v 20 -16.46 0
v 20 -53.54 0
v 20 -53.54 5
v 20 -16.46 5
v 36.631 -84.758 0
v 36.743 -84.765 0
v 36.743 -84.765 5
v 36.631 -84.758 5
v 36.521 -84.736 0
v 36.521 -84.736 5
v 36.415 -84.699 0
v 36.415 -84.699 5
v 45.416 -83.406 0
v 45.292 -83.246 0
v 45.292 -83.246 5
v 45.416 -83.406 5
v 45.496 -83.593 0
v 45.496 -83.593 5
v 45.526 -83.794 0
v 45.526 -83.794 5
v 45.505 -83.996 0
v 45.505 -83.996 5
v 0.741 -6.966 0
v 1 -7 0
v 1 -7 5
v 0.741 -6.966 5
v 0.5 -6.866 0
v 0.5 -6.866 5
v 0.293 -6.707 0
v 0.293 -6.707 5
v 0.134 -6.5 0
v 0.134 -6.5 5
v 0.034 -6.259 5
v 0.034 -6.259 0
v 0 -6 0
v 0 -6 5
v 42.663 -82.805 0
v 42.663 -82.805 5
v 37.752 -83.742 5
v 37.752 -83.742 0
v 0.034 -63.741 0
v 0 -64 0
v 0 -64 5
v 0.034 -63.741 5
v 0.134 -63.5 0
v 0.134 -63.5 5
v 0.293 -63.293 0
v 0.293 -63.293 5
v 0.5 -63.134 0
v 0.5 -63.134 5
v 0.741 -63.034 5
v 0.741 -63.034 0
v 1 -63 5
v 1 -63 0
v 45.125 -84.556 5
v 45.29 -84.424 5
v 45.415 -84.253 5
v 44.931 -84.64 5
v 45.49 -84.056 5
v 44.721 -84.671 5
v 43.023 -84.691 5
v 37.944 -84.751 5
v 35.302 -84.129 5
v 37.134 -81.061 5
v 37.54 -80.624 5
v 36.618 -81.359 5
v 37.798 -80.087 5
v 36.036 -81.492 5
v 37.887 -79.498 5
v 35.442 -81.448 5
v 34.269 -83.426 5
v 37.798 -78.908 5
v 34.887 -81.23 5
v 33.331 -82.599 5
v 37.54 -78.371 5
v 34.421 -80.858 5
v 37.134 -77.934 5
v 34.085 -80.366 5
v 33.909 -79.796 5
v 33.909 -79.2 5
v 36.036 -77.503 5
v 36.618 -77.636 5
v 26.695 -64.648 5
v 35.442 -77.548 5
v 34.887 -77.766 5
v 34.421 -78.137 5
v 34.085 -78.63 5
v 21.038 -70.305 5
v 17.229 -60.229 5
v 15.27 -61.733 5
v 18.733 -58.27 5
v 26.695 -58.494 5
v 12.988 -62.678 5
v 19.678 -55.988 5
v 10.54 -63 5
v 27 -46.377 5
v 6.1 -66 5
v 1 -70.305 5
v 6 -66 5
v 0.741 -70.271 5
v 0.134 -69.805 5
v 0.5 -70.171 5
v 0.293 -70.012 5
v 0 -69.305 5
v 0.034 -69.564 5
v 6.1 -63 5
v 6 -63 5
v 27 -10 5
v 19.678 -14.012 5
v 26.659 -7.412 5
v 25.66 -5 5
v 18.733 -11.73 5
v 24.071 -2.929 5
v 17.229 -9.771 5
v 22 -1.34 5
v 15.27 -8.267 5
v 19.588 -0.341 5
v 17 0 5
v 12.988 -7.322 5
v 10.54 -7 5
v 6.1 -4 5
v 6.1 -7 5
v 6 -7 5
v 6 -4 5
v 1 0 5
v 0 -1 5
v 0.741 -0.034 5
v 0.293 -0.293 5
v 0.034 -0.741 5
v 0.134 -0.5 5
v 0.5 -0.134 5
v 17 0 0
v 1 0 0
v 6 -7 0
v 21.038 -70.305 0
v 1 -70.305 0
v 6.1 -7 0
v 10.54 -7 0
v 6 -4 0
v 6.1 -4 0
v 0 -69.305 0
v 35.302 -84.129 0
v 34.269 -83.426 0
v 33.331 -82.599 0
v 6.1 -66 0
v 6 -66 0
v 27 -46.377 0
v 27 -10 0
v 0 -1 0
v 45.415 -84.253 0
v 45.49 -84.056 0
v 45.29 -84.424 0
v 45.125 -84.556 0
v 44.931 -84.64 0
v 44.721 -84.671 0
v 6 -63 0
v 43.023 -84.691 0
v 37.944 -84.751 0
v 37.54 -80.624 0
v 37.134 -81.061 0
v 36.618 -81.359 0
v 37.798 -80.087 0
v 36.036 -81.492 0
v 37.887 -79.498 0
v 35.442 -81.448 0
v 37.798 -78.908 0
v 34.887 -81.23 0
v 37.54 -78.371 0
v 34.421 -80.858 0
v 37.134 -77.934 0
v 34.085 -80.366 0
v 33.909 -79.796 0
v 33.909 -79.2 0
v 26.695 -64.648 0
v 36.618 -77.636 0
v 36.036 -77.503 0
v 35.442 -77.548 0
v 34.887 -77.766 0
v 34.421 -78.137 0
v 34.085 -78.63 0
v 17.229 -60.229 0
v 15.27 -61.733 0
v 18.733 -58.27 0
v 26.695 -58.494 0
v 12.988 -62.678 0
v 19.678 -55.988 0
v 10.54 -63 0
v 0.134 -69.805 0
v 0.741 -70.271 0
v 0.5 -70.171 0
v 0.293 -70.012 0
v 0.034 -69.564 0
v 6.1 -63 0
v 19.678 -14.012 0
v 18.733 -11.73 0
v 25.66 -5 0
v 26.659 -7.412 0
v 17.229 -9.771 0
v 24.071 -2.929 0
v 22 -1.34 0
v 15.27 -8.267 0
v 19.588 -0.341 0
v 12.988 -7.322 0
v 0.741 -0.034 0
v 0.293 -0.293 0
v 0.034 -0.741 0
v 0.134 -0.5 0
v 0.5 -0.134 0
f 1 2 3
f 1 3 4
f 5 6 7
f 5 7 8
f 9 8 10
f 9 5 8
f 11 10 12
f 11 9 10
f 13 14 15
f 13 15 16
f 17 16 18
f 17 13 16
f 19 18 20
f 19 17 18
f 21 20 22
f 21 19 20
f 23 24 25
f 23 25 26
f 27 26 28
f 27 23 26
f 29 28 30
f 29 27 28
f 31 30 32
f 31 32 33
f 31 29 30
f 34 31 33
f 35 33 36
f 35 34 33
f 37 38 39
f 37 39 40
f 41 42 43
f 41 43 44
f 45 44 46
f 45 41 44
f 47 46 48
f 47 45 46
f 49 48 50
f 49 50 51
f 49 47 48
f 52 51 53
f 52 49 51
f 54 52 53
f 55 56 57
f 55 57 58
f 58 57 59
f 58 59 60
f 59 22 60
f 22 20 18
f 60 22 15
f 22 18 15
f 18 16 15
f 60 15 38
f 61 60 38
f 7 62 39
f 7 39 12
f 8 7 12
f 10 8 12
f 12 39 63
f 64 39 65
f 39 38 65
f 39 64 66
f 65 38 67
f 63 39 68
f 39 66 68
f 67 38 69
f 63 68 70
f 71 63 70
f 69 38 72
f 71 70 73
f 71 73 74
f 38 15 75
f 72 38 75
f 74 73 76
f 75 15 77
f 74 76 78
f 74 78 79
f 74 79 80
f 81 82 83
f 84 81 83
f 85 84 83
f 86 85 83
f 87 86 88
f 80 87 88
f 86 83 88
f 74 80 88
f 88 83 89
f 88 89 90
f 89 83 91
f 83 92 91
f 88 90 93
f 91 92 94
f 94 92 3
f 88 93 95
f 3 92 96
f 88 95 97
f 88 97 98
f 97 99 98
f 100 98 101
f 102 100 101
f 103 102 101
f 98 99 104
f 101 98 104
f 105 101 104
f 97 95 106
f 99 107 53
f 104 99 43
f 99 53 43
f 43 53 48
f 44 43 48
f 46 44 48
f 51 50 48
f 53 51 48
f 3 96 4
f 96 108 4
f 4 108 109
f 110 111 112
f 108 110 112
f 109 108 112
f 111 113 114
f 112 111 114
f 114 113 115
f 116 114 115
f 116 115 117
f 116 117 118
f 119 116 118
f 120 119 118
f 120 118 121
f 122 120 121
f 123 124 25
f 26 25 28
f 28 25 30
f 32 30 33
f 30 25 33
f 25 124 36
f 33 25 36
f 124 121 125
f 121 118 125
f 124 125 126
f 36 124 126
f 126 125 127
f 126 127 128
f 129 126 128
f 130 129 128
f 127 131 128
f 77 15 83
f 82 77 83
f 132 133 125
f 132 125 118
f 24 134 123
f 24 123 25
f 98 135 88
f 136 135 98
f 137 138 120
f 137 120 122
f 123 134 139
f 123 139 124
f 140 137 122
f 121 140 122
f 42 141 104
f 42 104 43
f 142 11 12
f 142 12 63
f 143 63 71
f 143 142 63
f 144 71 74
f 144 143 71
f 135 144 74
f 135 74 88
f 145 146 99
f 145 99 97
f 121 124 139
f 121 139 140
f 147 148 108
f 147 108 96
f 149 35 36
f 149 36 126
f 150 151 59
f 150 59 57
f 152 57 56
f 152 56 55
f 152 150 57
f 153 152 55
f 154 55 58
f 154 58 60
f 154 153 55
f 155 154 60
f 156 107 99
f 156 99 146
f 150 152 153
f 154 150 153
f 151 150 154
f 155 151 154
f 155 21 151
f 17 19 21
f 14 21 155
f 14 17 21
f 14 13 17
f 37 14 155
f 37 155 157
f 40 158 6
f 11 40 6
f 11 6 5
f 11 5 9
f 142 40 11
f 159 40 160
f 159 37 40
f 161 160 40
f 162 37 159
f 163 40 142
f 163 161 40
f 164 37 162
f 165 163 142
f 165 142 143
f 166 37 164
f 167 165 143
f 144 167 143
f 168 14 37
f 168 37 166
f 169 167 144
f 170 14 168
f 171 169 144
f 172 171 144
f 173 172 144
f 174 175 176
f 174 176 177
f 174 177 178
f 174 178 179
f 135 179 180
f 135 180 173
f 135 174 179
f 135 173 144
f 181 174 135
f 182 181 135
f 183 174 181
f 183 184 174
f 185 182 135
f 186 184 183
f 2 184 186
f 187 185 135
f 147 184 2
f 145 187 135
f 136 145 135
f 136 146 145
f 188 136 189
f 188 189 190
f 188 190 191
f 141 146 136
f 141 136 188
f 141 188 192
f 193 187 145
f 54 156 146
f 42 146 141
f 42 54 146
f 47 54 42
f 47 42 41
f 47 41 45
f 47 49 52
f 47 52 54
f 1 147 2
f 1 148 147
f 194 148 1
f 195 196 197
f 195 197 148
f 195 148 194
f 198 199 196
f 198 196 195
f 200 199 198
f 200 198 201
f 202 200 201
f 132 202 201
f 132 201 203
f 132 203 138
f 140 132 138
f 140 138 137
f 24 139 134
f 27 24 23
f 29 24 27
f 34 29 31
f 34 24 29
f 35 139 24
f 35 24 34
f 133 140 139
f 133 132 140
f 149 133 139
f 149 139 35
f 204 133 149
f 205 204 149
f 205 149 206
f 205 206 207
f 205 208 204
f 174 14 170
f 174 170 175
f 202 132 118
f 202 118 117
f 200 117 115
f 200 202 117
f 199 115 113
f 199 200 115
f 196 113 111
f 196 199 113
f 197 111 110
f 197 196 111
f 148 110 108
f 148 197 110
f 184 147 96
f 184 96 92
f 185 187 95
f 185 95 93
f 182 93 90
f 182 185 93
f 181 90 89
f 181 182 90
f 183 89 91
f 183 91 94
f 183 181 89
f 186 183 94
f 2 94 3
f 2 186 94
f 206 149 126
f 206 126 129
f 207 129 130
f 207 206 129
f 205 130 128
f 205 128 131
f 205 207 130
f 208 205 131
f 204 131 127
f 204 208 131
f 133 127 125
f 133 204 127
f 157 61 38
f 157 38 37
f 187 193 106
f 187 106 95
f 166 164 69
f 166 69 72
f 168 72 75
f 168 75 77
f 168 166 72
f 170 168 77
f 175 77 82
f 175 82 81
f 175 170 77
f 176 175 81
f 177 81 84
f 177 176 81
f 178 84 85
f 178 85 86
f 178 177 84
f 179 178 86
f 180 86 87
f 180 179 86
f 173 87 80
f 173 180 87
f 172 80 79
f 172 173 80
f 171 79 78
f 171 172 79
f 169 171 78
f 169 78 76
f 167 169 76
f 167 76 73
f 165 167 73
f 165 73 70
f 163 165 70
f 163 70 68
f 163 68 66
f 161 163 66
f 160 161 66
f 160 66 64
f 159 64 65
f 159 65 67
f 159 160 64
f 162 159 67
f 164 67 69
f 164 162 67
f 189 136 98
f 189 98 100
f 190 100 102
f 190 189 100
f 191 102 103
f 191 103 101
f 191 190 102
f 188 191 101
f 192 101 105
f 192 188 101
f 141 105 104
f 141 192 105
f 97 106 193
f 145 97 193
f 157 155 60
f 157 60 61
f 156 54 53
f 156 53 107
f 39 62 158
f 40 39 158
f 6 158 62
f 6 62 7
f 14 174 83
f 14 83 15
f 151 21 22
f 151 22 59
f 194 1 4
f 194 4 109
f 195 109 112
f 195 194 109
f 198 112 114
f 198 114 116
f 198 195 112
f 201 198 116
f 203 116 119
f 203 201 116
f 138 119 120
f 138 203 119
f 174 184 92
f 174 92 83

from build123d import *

# Parameters (mm, degrees)
SKETCH1_R           = 2
BOSS_EXTRUDE1_DEPTH = 5
SKETCH2_W           = 0.1
SKETCH2_H           = 5
CUT_EXTRUDE1_DEPTH  = 3
SKETCH3_W           = 0.1
SKETCH3_H           = 5
CUT_EXTRUDE2_DEPTH  = 3
SKETCH5_W           = 5
SKETCH5_H           = 5
CUT_EXTRUDE3_DEPTH  = 3


with BuildPart() as part:
    # Sketch1 → Boss-Extrude1 (new body)
    with BuildSketch(Plane.XY):
        with BuildLine():
            Line((1, 0), (17, 0))
            ThreePointArc((17, 0), (24.071067812, -2.928932188), (27, -10))
            Line((27, -10), (27, -10.164726931))
            Line((27, -10.164726931), (27, -46.377180563))
            Line((27, -46.377180563), (26.694646109, -58.493944172))
            Line((26.694646109, -58.493944172), (26.694646109, -64.399649032))
            Line((26.694646109, -64.399649032), (26.694646109, -64.648499642))
            Line((26.694646109, -64.648499642), (45.291824906, -83.245678439))
            ThreePointArc((45.291824906, -83.245678439), (45.495822693, -83.59321769), (45.504515015, -83.996111065))
            Line((45.504515015, -83.996111065), (45.490365745, -84.055724665))
            ThreePointArc((45.490365745, -84.055724665), (45.211760066, -84.495661458), (44.721403846, -84.670922077))
            Line((44.721403846, -84.670922077), (36.743309345, -84.764807165))
            ThreePointArc((36.743309345, -84.764807165), (36.575585477, -84.749042296), (36.414881636, -84.698504168))
            ThreePointArc((36.414881636, -84.698504168), (34.774424803, -83.79382462), (33.33148975, -82.599051781))
            Line((33.33148975, -82.599051781), (21.037791859, -70.305353891))
            Line((21.037791859, -70.305353891), (16.801941123, -70.305353891))
            Line((16.801941123, -70.305353891), (1, -70.305353891))
            ThreePointArc((1, -70.305353891), (0.292893219, -70.012460672), (0, -69.305353891))
            Line((0, -69.305353891), (0, -64))
            ThreePointArc((0, -64), (0.292893219, -63.292893219), (1, -63))
            Line((1, -63), (10.539737479, -63))
            ThreePointArc((10.539737479, -63), (17.229153259, -60.229153259), (20, -53.539737479))
            Line((20, -53.539737479), (20, -16.460262521))
            ThreePointArc((20, -16.460262521), (17.229153259, -9.770846741), (10.539737479, -7))
            Line((10.539737479, -7), (1, -7))
            ThreePointArc((1, -7), (0.292893219, -6.707106781), (0, -6))
            Line((0, -6), (0, -1))
            ThreePointArc((0, -1), (0.292893219, -0.292893219), (1, 0))
        make_face()
        with Locations((35.887034264, -79.497742046)):
            Circle(SKETCH1_R, mode=Mode.SUBTRACT)
    extrude(amount=BOSS_EXTRUDE1_DEPTH)

    # Sketch2 → Cut-Extrude1 (cut)
    with BuildSketch(Plane(origin=(0, -63, 0), x_dir=(1, 0, 0), z_dir=(0, 1, 0))):
        with Locations((6.05, -2.5)):
            Rectangle(SKETCH2_W, SKETCH2_H)
    extrude(amount=-CUT_EXTRUDE1_DEPTH, mode=Mode.SUBTRACT)

    # Sketch3 → Cut-Extrude2 (cut)
    with BuildSketch(Plane.XZ.offset(7)):
        with Locations((6.05, 2.5)):
            Rectangle(SKETCH3_W, SKETCH3_H)
    extrude(amount=-CUT_EXTRUDE2_DEPTH, mode=Mode.SUBTRACT)

    # Sketch5 → Cut-Extrude3 (cut)
    with BuildSketch(Plane(origin=(17.315374744, -90.697945443, 0), x_dir=(0, 0, -1), z_dir=(0.18752569, -0.982259699, 0))):
        with Locations((-2.5, 23.878338891)):
            Rectangle(SKETCH5_W, SKETCH5_H)
    extrude(amount=-CUT_EXTRUDE3_DEPTH, mode=Mode.SUBTRACT)


solid = part.part
